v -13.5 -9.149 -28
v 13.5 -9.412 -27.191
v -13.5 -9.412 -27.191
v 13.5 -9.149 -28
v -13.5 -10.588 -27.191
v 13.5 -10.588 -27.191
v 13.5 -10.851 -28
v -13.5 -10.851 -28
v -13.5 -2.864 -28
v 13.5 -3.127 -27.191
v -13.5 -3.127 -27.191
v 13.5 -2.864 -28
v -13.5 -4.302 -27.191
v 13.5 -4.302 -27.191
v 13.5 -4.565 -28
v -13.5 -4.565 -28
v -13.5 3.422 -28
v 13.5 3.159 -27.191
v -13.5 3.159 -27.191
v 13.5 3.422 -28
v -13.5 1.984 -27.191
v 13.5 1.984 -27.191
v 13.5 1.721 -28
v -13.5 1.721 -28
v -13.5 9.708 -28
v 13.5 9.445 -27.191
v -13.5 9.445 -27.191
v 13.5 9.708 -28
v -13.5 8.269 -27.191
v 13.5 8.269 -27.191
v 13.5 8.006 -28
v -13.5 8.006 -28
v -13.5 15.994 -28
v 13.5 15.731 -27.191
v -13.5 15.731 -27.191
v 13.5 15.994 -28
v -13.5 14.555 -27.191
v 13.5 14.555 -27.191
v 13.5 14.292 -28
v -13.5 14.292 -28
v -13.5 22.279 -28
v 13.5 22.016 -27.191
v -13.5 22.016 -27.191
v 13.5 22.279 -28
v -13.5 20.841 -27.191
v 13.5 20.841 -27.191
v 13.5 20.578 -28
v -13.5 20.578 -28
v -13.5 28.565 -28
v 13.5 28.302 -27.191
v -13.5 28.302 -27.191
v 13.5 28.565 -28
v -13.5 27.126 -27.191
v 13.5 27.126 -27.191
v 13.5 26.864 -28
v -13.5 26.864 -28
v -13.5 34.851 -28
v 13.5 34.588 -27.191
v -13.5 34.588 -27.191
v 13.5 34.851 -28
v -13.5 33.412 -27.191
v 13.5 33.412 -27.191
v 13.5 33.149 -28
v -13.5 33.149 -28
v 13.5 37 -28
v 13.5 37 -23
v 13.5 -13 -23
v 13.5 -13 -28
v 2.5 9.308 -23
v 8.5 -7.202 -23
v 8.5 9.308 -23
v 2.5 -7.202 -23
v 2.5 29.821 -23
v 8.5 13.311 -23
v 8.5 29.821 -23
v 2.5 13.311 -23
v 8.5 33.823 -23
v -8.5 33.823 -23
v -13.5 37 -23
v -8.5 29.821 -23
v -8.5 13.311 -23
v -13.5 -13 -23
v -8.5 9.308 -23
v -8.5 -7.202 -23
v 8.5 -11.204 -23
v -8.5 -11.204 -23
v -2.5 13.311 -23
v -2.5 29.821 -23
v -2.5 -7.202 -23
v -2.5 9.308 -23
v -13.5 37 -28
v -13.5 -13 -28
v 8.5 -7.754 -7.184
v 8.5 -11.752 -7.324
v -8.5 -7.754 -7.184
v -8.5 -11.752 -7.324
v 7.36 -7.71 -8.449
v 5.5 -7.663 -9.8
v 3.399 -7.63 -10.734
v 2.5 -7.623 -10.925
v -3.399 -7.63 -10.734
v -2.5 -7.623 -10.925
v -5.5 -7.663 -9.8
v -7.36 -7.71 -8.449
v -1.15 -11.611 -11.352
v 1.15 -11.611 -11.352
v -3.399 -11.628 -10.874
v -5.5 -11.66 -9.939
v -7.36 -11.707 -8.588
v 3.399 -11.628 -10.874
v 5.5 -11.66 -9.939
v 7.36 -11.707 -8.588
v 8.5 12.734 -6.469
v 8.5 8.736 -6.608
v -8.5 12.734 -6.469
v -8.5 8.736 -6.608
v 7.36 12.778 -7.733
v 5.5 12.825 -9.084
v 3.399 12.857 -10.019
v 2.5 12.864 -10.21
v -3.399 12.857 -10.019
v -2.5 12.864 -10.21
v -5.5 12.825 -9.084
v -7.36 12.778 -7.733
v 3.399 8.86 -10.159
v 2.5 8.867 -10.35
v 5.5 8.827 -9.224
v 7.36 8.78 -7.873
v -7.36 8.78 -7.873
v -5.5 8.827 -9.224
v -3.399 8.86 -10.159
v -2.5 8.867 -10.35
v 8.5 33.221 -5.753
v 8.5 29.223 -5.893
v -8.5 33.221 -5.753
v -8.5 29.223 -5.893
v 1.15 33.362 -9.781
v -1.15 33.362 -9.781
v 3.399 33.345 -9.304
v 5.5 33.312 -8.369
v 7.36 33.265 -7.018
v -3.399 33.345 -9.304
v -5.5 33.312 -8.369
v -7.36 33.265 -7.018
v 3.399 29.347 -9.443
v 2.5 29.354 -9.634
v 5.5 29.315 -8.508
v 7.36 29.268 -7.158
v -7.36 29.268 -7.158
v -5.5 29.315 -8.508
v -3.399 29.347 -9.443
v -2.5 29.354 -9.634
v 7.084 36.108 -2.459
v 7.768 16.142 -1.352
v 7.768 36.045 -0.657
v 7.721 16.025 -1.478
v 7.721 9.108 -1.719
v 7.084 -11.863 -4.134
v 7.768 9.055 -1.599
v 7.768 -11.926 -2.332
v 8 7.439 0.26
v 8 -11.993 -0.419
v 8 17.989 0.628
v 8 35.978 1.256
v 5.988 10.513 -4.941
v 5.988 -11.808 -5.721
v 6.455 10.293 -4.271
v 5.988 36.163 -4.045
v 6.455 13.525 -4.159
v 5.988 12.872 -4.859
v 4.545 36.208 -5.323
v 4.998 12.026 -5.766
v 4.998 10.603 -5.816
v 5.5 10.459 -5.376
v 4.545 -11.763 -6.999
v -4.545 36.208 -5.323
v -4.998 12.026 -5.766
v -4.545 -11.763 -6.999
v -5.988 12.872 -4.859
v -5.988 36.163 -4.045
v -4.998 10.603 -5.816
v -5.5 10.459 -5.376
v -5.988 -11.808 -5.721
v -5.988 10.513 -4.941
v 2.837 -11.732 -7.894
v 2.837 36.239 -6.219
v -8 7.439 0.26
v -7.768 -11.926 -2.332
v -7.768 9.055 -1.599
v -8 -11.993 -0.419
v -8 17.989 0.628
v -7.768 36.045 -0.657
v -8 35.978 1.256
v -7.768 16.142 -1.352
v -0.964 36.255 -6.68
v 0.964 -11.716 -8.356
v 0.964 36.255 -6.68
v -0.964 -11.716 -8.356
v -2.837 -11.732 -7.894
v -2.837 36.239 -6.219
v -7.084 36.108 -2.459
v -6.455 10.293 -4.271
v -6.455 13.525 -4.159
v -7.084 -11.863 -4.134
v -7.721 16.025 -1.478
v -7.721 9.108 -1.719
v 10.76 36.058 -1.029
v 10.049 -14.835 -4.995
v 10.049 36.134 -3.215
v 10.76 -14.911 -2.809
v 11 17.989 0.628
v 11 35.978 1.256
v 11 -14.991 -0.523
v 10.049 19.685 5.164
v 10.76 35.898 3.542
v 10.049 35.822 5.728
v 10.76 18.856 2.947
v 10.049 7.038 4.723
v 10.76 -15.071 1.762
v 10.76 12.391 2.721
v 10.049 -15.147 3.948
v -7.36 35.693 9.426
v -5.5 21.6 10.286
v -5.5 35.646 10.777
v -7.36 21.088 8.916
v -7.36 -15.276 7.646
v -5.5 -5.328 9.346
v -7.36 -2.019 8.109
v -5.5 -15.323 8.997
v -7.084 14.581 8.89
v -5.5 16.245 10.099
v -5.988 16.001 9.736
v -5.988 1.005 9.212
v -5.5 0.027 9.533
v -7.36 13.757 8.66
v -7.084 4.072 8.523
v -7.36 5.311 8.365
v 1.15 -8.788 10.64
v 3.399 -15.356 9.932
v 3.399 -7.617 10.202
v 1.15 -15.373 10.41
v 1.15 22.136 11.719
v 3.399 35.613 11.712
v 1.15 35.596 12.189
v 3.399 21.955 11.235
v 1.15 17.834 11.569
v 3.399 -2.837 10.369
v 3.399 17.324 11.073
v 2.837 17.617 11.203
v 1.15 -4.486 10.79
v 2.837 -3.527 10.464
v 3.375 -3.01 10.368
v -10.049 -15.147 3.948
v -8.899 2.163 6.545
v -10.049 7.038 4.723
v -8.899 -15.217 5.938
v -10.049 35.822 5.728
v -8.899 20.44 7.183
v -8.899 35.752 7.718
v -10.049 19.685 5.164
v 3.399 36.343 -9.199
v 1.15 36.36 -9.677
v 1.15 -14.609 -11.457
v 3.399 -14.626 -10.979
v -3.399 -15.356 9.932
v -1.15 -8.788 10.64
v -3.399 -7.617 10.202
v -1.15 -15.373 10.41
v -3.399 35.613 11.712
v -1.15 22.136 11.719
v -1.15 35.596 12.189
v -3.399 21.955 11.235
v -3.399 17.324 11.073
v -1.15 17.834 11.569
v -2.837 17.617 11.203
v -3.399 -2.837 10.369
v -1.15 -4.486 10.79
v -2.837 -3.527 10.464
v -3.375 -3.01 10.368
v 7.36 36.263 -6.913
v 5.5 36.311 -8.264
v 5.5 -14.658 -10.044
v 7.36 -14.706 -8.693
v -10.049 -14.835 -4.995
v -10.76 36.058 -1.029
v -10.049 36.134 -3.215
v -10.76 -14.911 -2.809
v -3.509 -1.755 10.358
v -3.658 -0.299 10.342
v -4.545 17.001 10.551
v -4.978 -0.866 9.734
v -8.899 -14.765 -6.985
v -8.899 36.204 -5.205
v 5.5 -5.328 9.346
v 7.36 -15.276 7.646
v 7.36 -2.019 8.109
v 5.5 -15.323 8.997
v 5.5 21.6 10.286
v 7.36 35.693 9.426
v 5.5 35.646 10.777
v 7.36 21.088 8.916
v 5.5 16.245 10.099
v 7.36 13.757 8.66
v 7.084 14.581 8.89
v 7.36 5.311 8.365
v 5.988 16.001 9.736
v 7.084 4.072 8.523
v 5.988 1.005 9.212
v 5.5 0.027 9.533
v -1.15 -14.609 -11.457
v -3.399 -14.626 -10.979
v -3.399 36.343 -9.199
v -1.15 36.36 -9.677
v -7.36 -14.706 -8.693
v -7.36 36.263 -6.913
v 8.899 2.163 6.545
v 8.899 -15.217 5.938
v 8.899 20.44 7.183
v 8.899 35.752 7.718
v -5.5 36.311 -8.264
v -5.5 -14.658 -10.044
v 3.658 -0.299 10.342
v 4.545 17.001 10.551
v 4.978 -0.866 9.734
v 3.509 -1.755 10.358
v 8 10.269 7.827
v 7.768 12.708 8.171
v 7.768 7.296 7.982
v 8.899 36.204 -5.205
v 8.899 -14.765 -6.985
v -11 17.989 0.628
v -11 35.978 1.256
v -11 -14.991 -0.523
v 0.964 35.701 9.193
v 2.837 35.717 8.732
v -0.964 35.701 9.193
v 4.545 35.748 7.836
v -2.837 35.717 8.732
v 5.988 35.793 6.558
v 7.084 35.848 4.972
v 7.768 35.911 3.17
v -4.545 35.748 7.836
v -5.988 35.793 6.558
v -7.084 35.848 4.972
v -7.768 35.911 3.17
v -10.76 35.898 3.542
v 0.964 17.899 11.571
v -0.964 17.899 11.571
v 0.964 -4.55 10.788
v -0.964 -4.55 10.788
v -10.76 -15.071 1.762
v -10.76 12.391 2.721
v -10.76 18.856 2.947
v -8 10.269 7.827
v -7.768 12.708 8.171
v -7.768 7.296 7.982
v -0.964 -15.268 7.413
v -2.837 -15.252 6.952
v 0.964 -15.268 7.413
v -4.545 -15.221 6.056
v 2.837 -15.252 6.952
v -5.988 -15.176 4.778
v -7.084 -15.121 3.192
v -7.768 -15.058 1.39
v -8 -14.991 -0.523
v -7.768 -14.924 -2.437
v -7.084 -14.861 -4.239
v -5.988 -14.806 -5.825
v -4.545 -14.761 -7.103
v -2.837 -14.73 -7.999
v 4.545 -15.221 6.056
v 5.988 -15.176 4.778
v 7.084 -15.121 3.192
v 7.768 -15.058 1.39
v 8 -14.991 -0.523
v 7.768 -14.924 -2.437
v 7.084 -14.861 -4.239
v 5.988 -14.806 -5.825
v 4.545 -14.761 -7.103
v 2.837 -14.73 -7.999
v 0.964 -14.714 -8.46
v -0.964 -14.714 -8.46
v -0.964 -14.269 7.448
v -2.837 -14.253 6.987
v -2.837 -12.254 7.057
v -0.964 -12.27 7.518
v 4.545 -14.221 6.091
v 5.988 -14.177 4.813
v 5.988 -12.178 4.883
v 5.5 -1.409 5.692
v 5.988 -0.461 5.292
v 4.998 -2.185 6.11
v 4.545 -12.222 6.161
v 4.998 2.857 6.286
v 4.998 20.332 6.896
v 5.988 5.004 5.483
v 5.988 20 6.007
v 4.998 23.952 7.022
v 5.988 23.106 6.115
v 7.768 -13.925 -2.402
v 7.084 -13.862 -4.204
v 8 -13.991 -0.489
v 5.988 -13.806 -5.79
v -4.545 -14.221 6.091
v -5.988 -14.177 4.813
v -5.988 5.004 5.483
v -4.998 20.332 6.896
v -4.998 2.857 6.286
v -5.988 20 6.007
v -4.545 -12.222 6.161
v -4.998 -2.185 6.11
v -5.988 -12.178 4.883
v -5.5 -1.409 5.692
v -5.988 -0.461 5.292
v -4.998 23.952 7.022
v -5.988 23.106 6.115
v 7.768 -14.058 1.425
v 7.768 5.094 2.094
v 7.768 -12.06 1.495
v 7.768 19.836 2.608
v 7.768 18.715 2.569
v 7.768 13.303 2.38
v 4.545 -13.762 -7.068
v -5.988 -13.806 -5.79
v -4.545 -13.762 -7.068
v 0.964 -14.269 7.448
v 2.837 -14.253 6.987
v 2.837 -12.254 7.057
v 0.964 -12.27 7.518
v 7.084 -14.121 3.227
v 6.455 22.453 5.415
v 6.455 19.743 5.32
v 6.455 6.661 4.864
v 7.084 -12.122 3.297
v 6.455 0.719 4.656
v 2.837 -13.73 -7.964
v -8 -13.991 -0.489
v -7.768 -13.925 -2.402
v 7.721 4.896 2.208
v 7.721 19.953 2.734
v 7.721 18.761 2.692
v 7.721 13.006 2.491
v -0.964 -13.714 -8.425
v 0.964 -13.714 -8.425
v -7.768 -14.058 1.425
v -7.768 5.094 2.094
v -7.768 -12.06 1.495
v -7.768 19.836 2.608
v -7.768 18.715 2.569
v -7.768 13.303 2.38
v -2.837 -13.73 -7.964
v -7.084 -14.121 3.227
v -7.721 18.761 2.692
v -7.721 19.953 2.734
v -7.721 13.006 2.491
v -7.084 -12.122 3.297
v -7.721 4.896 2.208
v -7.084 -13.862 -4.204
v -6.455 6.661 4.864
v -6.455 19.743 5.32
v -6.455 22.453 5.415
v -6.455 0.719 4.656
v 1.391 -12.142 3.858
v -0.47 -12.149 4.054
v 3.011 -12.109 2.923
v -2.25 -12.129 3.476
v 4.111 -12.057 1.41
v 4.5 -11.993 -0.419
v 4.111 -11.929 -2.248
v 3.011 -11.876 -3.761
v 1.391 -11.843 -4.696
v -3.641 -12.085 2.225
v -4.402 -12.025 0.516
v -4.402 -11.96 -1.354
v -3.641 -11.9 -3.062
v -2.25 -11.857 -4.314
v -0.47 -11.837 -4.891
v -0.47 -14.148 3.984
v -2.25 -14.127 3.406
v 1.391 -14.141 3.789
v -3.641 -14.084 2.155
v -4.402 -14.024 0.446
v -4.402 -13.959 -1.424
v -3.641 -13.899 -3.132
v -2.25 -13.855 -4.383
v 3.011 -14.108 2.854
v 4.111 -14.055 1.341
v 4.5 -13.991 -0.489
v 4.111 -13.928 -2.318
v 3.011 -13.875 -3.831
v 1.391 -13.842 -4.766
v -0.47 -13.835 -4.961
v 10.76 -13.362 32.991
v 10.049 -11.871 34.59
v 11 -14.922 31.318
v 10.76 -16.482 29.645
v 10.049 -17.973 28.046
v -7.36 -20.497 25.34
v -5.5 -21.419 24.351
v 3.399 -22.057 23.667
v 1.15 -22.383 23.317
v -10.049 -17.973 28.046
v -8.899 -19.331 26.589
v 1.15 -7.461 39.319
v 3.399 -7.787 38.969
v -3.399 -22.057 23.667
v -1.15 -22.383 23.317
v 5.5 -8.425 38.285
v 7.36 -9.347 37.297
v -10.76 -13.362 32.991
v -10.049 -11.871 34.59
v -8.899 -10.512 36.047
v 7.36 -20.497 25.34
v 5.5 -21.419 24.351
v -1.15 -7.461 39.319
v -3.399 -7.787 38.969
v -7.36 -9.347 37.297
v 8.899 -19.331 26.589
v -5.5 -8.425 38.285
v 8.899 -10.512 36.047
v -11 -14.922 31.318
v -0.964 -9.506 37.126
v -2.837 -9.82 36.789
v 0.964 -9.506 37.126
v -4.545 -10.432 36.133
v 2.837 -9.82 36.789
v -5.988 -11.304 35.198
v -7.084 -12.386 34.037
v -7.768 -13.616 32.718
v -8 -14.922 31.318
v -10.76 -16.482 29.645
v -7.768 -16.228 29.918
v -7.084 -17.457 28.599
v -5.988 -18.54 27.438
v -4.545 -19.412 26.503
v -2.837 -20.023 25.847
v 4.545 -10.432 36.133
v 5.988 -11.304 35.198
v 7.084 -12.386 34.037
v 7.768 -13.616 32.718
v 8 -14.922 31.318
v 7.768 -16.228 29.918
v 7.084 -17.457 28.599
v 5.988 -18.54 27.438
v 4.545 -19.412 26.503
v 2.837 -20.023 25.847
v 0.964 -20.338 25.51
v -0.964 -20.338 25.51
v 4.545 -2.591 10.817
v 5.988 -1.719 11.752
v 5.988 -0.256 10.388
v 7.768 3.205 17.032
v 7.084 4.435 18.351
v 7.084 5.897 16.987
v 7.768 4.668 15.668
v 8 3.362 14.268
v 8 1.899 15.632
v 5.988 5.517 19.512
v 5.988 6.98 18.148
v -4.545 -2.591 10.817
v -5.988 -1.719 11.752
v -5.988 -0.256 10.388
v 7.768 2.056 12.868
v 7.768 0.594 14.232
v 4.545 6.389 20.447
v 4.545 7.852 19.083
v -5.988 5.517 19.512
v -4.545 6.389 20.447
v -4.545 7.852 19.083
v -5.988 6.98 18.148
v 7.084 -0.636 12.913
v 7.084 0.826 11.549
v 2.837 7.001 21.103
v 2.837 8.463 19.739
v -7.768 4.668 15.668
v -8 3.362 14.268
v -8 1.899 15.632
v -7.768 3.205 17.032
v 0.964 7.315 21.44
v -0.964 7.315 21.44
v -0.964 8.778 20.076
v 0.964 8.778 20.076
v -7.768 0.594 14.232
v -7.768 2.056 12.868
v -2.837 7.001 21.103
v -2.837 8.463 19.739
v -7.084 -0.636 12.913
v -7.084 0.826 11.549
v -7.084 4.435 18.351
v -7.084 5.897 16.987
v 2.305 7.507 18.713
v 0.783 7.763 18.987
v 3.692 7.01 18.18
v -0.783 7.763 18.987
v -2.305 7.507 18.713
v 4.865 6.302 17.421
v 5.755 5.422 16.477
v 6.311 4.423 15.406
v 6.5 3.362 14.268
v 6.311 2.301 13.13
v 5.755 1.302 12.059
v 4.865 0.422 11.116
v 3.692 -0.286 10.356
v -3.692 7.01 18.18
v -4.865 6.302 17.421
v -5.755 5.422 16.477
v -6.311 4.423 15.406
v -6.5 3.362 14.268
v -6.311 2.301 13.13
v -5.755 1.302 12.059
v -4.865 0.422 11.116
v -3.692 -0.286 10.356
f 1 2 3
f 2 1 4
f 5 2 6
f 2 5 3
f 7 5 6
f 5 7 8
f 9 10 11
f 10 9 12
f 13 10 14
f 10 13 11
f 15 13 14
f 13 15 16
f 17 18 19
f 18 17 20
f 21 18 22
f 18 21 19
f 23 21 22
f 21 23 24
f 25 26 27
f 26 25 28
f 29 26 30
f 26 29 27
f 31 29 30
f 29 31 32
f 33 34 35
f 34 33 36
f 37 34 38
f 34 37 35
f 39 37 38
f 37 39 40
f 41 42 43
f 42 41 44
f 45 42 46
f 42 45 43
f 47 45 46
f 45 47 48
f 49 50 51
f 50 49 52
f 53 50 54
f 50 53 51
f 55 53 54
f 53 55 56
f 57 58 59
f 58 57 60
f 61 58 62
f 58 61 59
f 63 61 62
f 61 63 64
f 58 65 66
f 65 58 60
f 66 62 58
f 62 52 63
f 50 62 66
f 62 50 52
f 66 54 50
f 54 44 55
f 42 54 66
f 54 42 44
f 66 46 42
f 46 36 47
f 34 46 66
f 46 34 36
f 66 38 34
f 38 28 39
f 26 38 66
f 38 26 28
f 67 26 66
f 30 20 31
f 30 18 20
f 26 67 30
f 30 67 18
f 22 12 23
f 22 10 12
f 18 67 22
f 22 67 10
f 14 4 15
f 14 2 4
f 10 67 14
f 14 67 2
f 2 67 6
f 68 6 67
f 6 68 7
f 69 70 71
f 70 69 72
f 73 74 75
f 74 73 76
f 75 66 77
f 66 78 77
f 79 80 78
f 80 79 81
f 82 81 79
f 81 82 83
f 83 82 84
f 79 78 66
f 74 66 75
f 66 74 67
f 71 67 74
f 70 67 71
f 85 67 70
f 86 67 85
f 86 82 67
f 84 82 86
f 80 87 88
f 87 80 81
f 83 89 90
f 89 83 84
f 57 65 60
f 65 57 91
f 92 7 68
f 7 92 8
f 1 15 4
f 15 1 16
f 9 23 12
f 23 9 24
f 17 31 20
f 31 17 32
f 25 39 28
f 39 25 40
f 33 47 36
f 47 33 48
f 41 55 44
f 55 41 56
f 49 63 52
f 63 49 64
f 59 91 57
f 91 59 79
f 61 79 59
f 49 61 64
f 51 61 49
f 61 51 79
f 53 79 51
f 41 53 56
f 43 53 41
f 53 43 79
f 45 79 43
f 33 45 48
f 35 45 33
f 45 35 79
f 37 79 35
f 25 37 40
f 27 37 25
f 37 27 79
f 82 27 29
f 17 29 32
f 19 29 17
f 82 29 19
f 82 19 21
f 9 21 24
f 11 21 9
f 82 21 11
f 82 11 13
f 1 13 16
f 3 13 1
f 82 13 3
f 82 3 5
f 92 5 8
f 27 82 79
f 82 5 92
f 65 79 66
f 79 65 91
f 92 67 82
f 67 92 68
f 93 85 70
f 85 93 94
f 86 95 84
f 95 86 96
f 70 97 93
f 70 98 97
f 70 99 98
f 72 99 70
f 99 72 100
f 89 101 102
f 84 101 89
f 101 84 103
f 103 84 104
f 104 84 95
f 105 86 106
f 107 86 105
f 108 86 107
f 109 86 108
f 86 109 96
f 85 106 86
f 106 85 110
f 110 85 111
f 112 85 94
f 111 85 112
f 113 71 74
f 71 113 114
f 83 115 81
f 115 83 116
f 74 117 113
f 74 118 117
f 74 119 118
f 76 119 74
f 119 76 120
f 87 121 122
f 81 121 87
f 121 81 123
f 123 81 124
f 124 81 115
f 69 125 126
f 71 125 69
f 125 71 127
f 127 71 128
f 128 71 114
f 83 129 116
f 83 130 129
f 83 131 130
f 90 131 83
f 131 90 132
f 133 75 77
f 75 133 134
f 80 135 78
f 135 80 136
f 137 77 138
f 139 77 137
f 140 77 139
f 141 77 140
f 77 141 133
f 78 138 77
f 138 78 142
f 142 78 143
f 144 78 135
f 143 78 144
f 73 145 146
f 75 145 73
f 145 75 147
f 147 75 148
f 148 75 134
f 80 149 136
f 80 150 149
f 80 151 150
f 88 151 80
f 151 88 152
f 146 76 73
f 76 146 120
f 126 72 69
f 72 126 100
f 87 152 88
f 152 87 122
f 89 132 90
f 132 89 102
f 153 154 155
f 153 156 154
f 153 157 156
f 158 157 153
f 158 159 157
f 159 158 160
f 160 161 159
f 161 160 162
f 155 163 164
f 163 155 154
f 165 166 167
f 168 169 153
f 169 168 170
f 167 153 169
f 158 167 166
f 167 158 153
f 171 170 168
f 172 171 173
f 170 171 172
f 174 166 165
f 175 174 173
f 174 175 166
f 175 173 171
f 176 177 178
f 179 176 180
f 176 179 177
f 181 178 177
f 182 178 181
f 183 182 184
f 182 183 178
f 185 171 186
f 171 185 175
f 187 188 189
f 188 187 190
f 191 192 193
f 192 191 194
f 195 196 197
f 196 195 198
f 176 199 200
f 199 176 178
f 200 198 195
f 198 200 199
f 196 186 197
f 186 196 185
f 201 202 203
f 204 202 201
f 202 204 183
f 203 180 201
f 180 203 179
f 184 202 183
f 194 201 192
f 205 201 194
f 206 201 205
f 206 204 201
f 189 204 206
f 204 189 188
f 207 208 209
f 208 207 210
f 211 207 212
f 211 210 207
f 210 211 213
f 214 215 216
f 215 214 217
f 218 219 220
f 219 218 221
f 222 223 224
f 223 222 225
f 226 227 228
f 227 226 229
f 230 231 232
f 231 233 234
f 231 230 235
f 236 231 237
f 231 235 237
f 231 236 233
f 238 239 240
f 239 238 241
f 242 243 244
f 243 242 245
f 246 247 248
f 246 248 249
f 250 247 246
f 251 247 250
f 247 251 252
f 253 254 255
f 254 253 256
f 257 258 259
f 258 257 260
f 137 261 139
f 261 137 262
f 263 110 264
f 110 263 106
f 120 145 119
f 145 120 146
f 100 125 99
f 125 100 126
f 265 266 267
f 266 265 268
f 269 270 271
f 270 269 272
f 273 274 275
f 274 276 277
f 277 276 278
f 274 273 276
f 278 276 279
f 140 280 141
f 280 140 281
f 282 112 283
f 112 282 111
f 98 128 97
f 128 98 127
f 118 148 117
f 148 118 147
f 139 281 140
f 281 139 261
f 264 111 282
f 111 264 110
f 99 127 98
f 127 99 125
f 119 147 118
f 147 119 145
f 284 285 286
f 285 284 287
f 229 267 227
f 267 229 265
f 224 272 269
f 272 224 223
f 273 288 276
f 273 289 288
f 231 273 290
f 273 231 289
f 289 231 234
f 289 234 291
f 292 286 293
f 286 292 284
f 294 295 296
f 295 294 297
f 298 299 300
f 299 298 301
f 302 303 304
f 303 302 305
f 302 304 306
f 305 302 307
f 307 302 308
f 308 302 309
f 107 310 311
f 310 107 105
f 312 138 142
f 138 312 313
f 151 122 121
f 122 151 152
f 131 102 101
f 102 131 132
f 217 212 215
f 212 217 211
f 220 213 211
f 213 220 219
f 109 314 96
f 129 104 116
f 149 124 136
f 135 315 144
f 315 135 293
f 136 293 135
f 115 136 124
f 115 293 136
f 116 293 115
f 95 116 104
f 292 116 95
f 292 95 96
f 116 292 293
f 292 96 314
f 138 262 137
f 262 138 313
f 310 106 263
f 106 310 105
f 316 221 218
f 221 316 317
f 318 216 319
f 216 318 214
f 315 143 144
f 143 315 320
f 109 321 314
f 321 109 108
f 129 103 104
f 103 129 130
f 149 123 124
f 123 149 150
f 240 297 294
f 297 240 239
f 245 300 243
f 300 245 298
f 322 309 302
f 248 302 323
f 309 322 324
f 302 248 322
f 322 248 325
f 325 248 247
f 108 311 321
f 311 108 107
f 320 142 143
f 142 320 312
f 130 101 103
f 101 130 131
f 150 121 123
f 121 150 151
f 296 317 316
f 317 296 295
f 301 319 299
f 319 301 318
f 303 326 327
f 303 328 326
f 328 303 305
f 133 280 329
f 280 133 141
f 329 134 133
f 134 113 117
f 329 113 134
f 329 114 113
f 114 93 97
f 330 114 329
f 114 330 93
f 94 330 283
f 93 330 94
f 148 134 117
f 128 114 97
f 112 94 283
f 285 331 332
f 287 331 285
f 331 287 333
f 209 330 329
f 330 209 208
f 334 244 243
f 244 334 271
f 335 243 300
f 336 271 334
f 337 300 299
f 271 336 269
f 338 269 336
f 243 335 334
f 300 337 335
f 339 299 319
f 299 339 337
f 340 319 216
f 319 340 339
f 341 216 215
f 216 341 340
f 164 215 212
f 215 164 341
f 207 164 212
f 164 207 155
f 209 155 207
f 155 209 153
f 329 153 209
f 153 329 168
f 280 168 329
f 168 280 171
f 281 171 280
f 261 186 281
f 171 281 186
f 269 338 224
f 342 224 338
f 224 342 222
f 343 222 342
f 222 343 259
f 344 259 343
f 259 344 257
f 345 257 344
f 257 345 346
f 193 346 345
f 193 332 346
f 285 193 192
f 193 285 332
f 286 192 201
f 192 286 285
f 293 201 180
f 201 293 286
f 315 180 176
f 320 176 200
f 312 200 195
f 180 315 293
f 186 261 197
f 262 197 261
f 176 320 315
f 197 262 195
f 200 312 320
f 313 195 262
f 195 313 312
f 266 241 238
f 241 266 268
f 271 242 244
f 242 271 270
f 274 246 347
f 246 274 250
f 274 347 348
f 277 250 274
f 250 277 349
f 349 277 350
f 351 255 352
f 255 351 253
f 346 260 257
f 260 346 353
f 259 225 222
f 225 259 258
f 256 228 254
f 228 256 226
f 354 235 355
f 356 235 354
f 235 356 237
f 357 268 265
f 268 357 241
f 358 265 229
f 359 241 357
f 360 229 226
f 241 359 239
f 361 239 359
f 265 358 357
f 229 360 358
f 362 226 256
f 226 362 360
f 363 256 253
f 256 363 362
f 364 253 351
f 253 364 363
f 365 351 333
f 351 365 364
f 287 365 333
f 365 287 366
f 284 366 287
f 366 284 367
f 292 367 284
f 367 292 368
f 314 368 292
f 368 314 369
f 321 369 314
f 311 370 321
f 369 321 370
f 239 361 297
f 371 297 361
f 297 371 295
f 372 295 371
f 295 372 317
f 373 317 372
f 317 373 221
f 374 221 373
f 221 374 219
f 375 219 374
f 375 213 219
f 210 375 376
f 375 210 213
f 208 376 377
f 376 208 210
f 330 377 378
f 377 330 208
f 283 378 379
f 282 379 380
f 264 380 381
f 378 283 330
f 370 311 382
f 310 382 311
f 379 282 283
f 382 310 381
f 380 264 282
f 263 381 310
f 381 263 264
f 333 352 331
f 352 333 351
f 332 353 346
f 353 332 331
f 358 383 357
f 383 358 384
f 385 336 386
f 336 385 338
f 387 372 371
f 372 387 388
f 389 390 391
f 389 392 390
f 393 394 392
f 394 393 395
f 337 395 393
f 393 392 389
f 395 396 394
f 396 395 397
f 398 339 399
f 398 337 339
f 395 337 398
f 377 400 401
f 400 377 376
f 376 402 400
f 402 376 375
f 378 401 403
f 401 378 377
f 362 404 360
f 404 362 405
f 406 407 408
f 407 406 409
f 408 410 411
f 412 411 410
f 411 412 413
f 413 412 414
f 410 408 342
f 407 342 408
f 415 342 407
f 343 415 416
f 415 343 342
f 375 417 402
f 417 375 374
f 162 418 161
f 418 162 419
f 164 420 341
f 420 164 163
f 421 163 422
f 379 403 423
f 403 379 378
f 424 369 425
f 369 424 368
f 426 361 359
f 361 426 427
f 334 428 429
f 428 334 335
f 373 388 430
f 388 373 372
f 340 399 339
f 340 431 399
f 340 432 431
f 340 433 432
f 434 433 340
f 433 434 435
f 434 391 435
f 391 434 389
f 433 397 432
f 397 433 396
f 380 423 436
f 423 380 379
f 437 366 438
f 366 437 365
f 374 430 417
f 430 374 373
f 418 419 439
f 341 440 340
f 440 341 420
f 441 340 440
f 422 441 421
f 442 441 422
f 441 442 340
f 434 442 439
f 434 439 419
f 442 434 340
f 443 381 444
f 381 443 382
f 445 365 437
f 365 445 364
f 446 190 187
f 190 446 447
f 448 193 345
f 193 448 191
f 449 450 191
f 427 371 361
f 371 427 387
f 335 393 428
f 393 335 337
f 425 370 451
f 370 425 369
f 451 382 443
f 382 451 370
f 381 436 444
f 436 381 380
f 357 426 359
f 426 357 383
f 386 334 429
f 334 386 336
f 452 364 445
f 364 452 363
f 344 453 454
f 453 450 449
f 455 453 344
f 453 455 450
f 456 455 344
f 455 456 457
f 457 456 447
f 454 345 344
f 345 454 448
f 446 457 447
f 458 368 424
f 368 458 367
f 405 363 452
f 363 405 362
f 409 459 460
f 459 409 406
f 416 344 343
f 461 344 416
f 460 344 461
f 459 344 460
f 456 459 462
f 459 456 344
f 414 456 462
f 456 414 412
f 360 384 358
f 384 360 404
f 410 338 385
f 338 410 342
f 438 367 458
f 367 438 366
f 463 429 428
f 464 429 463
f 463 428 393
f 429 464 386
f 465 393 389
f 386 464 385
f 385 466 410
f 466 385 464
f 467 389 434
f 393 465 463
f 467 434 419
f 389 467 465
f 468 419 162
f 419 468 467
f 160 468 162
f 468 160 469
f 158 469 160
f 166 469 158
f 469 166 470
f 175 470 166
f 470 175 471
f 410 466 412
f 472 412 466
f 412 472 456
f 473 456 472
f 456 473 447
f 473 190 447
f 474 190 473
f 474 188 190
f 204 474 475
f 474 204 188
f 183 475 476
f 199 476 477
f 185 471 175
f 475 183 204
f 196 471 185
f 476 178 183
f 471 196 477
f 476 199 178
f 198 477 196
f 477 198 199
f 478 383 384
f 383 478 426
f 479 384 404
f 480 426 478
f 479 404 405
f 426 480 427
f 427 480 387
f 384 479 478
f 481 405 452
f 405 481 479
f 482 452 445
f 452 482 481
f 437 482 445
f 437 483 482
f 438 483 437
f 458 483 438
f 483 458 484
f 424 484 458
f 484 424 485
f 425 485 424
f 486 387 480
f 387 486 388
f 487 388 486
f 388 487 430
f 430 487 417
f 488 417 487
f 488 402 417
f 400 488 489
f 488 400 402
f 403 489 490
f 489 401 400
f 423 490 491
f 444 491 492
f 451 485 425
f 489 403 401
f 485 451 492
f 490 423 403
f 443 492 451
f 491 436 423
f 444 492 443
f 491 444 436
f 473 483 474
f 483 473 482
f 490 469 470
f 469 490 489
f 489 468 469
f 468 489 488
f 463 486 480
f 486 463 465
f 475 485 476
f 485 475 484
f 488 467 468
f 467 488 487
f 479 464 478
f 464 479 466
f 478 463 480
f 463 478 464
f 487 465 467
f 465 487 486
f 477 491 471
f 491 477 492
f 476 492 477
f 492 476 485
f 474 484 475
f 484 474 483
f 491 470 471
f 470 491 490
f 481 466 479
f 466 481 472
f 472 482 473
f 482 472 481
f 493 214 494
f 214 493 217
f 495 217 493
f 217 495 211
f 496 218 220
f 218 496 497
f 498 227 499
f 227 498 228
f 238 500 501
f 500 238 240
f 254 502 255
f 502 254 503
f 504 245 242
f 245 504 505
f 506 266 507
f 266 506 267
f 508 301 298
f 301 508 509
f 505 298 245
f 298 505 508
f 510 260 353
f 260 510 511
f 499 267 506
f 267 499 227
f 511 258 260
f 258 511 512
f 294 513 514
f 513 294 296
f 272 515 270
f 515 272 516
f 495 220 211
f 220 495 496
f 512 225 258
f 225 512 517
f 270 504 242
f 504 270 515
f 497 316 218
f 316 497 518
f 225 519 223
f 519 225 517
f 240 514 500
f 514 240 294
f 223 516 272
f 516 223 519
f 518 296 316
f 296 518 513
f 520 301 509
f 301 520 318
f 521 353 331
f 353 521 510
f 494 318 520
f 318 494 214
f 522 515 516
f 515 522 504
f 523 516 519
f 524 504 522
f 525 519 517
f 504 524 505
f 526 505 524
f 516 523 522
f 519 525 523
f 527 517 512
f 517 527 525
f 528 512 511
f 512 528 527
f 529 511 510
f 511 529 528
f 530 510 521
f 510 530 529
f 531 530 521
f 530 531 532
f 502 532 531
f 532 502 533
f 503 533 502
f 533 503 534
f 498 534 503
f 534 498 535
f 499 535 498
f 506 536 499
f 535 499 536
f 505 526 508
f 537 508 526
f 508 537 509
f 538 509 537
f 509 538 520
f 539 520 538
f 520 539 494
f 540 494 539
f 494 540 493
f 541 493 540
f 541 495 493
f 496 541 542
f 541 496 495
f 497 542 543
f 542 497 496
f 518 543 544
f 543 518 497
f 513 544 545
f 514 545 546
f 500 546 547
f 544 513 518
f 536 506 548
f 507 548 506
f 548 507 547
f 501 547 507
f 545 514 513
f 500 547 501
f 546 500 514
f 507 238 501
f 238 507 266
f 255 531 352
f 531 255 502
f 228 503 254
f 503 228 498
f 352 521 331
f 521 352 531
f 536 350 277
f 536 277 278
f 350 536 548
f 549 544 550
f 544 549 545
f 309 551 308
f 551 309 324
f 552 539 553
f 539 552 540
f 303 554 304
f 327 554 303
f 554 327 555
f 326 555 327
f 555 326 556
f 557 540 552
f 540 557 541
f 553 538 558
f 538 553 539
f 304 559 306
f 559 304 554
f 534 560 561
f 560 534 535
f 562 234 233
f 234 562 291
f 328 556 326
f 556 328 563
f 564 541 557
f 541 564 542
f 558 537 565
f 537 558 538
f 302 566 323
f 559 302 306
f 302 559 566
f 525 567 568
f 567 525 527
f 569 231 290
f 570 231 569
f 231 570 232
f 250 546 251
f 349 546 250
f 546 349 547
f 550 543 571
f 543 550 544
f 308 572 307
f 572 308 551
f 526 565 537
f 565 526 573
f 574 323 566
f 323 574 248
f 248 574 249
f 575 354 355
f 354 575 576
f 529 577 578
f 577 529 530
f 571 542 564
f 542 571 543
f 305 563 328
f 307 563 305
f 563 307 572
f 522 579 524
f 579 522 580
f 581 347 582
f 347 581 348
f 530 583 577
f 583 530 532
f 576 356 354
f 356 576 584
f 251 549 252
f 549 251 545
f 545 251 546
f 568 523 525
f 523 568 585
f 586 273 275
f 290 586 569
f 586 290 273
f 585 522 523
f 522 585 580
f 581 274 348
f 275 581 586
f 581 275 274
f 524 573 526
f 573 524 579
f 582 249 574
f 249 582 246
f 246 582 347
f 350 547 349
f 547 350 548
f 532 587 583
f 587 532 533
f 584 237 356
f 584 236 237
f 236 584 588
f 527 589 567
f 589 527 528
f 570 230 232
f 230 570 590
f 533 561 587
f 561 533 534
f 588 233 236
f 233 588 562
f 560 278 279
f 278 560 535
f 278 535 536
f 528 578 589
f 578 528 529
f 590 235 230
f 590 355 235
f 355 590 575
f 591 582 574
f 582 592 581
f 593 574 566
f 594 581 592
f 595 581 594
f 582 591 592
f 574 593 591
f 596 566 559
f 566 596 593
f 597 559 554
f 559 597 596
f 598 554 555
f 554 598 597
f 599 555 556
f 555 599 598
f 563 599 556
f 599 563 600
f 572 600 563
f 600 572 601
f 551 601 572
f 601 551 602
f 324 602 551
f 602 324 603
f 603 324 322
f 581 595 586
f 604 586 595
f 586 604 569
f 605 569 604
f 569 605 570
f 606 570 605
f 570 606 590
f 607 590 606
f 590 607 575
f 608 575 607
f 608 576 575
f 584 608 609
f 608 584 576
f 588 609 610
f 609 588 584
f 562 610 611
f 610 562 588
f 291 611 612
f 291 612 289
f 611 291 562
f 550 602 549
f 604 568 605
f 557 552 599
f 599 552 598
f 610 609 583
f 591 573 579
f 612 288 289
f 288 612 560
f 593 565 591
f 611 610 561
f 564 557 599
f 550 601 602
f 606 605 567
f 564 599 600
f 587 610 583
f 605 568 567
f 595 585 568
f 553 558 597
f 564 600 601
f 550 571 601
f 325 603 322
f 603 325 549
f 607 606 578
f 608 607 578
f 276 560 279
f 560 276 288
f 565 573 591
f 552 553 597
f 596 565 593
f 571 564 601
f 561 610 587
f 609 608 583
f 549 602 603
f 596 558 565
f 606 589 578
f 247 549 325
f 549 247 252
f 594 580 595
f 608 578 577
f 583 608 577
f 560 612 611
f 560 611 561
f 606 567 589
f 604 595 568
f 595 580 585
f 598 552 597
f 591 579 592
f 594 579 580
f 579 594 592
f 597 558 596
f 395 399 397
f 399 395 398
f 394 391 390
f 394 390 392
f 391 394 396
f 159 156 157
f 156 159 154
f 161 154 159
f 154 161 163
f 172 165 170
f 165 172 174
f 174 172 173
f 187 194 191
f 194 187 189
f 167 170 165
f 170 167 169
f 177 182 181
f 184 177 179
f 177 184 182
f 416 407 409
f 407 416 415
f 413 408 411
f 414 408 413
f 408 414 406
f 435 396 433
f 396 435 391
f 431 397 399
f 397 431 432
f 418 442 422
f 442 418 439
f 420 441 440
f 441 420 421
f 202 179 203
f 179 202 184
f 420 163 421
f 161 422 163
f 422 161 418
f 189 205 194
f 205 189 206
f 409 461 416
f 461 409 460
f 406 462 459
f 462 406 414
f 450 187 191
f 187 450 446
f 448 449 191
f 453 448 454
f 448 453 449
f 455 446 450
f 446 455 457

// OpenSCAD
tubelen = 45;
toprad = 45;
btmrad = 10;

ringsz = 2;


module tubes() {
color("green")
translate([0,-13-ringsz,0])
rotate([-90,0,0])
union() {
    difference() {
        cylinder(tubelen+ringsz+4, 22/2, 22/2);
        cylinder(tubelen+tubelen, 16/2, 16/2);

    }
    // inner ring
    translate([0,0,-1+ringsz])
    difference() {
    cylinder(ringsz, 22/2, 22/2);
    cylinder(ringsz, 9/2, 9/2);
    }
}

module bottomDiff() {
    // bottom diff
    rotate([-90-toprad,0,0])
    translate([0,0,-50])
    cylinder(100, 16/2, 16/2);
}

color("gray")
translate([0,tubelen/2*.8/*tubelen%toprad*/,0])
rotate([toprad,0,0])
difference()
{
    union() {
        difference() {
            cylinder(tubelen, 22/2, 22/2);
            cylinder(tubelen, 16/2, 16/2);
            
        }
        //inner ring
        translate([0,0,20])
        difference() {
            cylinder(ringsz, 22/2, 22/2);
            cylinder(ringsz, 13/2, 16/2);
        }
    }
    bottomDiff();
}
}


module bottomcolumn() {
color("red") {
    difference() {
        union()
        {        
            //center
            translate([-5/2,-10,-25])
            cube([5, tubelen-ringsz, 25]);
            
            //edges
            cnt = 3;
            w = 17;
            gap = (tubelen+13 - cnt*w) / (cnt -1);
            
            for (i = [0:cnt-1])
            {
                translate([-w/2, i*(w + gap)-12,-25])
                cube([w, 4, 25]); 
            }
        }
        
    rotate([-90,0,0])
    translate([0,0,-60])
    cylinder(100, 16/2, 16/2);
    }
}
}



module bottom() {
//bottom
color("yellow")
//translate([30,0,-0])
translate([-27/2,-13,-28])
difference() {
cube([27, tubelen+5, 5]);

cnt = 8;
w = 1;
gap = (tubelen - cnt*w) / (cnt -1);

for (i = [0:cnt-1])
{
    translate([-tubelen, i*(w + gap)+3,0])
    rotate([0,90,0])
    cylinder(tubelen*2, w,w); 
}
}
}

bottom();
rotate([2,0,0]) {
bottomcolumn();
tubes();
}
